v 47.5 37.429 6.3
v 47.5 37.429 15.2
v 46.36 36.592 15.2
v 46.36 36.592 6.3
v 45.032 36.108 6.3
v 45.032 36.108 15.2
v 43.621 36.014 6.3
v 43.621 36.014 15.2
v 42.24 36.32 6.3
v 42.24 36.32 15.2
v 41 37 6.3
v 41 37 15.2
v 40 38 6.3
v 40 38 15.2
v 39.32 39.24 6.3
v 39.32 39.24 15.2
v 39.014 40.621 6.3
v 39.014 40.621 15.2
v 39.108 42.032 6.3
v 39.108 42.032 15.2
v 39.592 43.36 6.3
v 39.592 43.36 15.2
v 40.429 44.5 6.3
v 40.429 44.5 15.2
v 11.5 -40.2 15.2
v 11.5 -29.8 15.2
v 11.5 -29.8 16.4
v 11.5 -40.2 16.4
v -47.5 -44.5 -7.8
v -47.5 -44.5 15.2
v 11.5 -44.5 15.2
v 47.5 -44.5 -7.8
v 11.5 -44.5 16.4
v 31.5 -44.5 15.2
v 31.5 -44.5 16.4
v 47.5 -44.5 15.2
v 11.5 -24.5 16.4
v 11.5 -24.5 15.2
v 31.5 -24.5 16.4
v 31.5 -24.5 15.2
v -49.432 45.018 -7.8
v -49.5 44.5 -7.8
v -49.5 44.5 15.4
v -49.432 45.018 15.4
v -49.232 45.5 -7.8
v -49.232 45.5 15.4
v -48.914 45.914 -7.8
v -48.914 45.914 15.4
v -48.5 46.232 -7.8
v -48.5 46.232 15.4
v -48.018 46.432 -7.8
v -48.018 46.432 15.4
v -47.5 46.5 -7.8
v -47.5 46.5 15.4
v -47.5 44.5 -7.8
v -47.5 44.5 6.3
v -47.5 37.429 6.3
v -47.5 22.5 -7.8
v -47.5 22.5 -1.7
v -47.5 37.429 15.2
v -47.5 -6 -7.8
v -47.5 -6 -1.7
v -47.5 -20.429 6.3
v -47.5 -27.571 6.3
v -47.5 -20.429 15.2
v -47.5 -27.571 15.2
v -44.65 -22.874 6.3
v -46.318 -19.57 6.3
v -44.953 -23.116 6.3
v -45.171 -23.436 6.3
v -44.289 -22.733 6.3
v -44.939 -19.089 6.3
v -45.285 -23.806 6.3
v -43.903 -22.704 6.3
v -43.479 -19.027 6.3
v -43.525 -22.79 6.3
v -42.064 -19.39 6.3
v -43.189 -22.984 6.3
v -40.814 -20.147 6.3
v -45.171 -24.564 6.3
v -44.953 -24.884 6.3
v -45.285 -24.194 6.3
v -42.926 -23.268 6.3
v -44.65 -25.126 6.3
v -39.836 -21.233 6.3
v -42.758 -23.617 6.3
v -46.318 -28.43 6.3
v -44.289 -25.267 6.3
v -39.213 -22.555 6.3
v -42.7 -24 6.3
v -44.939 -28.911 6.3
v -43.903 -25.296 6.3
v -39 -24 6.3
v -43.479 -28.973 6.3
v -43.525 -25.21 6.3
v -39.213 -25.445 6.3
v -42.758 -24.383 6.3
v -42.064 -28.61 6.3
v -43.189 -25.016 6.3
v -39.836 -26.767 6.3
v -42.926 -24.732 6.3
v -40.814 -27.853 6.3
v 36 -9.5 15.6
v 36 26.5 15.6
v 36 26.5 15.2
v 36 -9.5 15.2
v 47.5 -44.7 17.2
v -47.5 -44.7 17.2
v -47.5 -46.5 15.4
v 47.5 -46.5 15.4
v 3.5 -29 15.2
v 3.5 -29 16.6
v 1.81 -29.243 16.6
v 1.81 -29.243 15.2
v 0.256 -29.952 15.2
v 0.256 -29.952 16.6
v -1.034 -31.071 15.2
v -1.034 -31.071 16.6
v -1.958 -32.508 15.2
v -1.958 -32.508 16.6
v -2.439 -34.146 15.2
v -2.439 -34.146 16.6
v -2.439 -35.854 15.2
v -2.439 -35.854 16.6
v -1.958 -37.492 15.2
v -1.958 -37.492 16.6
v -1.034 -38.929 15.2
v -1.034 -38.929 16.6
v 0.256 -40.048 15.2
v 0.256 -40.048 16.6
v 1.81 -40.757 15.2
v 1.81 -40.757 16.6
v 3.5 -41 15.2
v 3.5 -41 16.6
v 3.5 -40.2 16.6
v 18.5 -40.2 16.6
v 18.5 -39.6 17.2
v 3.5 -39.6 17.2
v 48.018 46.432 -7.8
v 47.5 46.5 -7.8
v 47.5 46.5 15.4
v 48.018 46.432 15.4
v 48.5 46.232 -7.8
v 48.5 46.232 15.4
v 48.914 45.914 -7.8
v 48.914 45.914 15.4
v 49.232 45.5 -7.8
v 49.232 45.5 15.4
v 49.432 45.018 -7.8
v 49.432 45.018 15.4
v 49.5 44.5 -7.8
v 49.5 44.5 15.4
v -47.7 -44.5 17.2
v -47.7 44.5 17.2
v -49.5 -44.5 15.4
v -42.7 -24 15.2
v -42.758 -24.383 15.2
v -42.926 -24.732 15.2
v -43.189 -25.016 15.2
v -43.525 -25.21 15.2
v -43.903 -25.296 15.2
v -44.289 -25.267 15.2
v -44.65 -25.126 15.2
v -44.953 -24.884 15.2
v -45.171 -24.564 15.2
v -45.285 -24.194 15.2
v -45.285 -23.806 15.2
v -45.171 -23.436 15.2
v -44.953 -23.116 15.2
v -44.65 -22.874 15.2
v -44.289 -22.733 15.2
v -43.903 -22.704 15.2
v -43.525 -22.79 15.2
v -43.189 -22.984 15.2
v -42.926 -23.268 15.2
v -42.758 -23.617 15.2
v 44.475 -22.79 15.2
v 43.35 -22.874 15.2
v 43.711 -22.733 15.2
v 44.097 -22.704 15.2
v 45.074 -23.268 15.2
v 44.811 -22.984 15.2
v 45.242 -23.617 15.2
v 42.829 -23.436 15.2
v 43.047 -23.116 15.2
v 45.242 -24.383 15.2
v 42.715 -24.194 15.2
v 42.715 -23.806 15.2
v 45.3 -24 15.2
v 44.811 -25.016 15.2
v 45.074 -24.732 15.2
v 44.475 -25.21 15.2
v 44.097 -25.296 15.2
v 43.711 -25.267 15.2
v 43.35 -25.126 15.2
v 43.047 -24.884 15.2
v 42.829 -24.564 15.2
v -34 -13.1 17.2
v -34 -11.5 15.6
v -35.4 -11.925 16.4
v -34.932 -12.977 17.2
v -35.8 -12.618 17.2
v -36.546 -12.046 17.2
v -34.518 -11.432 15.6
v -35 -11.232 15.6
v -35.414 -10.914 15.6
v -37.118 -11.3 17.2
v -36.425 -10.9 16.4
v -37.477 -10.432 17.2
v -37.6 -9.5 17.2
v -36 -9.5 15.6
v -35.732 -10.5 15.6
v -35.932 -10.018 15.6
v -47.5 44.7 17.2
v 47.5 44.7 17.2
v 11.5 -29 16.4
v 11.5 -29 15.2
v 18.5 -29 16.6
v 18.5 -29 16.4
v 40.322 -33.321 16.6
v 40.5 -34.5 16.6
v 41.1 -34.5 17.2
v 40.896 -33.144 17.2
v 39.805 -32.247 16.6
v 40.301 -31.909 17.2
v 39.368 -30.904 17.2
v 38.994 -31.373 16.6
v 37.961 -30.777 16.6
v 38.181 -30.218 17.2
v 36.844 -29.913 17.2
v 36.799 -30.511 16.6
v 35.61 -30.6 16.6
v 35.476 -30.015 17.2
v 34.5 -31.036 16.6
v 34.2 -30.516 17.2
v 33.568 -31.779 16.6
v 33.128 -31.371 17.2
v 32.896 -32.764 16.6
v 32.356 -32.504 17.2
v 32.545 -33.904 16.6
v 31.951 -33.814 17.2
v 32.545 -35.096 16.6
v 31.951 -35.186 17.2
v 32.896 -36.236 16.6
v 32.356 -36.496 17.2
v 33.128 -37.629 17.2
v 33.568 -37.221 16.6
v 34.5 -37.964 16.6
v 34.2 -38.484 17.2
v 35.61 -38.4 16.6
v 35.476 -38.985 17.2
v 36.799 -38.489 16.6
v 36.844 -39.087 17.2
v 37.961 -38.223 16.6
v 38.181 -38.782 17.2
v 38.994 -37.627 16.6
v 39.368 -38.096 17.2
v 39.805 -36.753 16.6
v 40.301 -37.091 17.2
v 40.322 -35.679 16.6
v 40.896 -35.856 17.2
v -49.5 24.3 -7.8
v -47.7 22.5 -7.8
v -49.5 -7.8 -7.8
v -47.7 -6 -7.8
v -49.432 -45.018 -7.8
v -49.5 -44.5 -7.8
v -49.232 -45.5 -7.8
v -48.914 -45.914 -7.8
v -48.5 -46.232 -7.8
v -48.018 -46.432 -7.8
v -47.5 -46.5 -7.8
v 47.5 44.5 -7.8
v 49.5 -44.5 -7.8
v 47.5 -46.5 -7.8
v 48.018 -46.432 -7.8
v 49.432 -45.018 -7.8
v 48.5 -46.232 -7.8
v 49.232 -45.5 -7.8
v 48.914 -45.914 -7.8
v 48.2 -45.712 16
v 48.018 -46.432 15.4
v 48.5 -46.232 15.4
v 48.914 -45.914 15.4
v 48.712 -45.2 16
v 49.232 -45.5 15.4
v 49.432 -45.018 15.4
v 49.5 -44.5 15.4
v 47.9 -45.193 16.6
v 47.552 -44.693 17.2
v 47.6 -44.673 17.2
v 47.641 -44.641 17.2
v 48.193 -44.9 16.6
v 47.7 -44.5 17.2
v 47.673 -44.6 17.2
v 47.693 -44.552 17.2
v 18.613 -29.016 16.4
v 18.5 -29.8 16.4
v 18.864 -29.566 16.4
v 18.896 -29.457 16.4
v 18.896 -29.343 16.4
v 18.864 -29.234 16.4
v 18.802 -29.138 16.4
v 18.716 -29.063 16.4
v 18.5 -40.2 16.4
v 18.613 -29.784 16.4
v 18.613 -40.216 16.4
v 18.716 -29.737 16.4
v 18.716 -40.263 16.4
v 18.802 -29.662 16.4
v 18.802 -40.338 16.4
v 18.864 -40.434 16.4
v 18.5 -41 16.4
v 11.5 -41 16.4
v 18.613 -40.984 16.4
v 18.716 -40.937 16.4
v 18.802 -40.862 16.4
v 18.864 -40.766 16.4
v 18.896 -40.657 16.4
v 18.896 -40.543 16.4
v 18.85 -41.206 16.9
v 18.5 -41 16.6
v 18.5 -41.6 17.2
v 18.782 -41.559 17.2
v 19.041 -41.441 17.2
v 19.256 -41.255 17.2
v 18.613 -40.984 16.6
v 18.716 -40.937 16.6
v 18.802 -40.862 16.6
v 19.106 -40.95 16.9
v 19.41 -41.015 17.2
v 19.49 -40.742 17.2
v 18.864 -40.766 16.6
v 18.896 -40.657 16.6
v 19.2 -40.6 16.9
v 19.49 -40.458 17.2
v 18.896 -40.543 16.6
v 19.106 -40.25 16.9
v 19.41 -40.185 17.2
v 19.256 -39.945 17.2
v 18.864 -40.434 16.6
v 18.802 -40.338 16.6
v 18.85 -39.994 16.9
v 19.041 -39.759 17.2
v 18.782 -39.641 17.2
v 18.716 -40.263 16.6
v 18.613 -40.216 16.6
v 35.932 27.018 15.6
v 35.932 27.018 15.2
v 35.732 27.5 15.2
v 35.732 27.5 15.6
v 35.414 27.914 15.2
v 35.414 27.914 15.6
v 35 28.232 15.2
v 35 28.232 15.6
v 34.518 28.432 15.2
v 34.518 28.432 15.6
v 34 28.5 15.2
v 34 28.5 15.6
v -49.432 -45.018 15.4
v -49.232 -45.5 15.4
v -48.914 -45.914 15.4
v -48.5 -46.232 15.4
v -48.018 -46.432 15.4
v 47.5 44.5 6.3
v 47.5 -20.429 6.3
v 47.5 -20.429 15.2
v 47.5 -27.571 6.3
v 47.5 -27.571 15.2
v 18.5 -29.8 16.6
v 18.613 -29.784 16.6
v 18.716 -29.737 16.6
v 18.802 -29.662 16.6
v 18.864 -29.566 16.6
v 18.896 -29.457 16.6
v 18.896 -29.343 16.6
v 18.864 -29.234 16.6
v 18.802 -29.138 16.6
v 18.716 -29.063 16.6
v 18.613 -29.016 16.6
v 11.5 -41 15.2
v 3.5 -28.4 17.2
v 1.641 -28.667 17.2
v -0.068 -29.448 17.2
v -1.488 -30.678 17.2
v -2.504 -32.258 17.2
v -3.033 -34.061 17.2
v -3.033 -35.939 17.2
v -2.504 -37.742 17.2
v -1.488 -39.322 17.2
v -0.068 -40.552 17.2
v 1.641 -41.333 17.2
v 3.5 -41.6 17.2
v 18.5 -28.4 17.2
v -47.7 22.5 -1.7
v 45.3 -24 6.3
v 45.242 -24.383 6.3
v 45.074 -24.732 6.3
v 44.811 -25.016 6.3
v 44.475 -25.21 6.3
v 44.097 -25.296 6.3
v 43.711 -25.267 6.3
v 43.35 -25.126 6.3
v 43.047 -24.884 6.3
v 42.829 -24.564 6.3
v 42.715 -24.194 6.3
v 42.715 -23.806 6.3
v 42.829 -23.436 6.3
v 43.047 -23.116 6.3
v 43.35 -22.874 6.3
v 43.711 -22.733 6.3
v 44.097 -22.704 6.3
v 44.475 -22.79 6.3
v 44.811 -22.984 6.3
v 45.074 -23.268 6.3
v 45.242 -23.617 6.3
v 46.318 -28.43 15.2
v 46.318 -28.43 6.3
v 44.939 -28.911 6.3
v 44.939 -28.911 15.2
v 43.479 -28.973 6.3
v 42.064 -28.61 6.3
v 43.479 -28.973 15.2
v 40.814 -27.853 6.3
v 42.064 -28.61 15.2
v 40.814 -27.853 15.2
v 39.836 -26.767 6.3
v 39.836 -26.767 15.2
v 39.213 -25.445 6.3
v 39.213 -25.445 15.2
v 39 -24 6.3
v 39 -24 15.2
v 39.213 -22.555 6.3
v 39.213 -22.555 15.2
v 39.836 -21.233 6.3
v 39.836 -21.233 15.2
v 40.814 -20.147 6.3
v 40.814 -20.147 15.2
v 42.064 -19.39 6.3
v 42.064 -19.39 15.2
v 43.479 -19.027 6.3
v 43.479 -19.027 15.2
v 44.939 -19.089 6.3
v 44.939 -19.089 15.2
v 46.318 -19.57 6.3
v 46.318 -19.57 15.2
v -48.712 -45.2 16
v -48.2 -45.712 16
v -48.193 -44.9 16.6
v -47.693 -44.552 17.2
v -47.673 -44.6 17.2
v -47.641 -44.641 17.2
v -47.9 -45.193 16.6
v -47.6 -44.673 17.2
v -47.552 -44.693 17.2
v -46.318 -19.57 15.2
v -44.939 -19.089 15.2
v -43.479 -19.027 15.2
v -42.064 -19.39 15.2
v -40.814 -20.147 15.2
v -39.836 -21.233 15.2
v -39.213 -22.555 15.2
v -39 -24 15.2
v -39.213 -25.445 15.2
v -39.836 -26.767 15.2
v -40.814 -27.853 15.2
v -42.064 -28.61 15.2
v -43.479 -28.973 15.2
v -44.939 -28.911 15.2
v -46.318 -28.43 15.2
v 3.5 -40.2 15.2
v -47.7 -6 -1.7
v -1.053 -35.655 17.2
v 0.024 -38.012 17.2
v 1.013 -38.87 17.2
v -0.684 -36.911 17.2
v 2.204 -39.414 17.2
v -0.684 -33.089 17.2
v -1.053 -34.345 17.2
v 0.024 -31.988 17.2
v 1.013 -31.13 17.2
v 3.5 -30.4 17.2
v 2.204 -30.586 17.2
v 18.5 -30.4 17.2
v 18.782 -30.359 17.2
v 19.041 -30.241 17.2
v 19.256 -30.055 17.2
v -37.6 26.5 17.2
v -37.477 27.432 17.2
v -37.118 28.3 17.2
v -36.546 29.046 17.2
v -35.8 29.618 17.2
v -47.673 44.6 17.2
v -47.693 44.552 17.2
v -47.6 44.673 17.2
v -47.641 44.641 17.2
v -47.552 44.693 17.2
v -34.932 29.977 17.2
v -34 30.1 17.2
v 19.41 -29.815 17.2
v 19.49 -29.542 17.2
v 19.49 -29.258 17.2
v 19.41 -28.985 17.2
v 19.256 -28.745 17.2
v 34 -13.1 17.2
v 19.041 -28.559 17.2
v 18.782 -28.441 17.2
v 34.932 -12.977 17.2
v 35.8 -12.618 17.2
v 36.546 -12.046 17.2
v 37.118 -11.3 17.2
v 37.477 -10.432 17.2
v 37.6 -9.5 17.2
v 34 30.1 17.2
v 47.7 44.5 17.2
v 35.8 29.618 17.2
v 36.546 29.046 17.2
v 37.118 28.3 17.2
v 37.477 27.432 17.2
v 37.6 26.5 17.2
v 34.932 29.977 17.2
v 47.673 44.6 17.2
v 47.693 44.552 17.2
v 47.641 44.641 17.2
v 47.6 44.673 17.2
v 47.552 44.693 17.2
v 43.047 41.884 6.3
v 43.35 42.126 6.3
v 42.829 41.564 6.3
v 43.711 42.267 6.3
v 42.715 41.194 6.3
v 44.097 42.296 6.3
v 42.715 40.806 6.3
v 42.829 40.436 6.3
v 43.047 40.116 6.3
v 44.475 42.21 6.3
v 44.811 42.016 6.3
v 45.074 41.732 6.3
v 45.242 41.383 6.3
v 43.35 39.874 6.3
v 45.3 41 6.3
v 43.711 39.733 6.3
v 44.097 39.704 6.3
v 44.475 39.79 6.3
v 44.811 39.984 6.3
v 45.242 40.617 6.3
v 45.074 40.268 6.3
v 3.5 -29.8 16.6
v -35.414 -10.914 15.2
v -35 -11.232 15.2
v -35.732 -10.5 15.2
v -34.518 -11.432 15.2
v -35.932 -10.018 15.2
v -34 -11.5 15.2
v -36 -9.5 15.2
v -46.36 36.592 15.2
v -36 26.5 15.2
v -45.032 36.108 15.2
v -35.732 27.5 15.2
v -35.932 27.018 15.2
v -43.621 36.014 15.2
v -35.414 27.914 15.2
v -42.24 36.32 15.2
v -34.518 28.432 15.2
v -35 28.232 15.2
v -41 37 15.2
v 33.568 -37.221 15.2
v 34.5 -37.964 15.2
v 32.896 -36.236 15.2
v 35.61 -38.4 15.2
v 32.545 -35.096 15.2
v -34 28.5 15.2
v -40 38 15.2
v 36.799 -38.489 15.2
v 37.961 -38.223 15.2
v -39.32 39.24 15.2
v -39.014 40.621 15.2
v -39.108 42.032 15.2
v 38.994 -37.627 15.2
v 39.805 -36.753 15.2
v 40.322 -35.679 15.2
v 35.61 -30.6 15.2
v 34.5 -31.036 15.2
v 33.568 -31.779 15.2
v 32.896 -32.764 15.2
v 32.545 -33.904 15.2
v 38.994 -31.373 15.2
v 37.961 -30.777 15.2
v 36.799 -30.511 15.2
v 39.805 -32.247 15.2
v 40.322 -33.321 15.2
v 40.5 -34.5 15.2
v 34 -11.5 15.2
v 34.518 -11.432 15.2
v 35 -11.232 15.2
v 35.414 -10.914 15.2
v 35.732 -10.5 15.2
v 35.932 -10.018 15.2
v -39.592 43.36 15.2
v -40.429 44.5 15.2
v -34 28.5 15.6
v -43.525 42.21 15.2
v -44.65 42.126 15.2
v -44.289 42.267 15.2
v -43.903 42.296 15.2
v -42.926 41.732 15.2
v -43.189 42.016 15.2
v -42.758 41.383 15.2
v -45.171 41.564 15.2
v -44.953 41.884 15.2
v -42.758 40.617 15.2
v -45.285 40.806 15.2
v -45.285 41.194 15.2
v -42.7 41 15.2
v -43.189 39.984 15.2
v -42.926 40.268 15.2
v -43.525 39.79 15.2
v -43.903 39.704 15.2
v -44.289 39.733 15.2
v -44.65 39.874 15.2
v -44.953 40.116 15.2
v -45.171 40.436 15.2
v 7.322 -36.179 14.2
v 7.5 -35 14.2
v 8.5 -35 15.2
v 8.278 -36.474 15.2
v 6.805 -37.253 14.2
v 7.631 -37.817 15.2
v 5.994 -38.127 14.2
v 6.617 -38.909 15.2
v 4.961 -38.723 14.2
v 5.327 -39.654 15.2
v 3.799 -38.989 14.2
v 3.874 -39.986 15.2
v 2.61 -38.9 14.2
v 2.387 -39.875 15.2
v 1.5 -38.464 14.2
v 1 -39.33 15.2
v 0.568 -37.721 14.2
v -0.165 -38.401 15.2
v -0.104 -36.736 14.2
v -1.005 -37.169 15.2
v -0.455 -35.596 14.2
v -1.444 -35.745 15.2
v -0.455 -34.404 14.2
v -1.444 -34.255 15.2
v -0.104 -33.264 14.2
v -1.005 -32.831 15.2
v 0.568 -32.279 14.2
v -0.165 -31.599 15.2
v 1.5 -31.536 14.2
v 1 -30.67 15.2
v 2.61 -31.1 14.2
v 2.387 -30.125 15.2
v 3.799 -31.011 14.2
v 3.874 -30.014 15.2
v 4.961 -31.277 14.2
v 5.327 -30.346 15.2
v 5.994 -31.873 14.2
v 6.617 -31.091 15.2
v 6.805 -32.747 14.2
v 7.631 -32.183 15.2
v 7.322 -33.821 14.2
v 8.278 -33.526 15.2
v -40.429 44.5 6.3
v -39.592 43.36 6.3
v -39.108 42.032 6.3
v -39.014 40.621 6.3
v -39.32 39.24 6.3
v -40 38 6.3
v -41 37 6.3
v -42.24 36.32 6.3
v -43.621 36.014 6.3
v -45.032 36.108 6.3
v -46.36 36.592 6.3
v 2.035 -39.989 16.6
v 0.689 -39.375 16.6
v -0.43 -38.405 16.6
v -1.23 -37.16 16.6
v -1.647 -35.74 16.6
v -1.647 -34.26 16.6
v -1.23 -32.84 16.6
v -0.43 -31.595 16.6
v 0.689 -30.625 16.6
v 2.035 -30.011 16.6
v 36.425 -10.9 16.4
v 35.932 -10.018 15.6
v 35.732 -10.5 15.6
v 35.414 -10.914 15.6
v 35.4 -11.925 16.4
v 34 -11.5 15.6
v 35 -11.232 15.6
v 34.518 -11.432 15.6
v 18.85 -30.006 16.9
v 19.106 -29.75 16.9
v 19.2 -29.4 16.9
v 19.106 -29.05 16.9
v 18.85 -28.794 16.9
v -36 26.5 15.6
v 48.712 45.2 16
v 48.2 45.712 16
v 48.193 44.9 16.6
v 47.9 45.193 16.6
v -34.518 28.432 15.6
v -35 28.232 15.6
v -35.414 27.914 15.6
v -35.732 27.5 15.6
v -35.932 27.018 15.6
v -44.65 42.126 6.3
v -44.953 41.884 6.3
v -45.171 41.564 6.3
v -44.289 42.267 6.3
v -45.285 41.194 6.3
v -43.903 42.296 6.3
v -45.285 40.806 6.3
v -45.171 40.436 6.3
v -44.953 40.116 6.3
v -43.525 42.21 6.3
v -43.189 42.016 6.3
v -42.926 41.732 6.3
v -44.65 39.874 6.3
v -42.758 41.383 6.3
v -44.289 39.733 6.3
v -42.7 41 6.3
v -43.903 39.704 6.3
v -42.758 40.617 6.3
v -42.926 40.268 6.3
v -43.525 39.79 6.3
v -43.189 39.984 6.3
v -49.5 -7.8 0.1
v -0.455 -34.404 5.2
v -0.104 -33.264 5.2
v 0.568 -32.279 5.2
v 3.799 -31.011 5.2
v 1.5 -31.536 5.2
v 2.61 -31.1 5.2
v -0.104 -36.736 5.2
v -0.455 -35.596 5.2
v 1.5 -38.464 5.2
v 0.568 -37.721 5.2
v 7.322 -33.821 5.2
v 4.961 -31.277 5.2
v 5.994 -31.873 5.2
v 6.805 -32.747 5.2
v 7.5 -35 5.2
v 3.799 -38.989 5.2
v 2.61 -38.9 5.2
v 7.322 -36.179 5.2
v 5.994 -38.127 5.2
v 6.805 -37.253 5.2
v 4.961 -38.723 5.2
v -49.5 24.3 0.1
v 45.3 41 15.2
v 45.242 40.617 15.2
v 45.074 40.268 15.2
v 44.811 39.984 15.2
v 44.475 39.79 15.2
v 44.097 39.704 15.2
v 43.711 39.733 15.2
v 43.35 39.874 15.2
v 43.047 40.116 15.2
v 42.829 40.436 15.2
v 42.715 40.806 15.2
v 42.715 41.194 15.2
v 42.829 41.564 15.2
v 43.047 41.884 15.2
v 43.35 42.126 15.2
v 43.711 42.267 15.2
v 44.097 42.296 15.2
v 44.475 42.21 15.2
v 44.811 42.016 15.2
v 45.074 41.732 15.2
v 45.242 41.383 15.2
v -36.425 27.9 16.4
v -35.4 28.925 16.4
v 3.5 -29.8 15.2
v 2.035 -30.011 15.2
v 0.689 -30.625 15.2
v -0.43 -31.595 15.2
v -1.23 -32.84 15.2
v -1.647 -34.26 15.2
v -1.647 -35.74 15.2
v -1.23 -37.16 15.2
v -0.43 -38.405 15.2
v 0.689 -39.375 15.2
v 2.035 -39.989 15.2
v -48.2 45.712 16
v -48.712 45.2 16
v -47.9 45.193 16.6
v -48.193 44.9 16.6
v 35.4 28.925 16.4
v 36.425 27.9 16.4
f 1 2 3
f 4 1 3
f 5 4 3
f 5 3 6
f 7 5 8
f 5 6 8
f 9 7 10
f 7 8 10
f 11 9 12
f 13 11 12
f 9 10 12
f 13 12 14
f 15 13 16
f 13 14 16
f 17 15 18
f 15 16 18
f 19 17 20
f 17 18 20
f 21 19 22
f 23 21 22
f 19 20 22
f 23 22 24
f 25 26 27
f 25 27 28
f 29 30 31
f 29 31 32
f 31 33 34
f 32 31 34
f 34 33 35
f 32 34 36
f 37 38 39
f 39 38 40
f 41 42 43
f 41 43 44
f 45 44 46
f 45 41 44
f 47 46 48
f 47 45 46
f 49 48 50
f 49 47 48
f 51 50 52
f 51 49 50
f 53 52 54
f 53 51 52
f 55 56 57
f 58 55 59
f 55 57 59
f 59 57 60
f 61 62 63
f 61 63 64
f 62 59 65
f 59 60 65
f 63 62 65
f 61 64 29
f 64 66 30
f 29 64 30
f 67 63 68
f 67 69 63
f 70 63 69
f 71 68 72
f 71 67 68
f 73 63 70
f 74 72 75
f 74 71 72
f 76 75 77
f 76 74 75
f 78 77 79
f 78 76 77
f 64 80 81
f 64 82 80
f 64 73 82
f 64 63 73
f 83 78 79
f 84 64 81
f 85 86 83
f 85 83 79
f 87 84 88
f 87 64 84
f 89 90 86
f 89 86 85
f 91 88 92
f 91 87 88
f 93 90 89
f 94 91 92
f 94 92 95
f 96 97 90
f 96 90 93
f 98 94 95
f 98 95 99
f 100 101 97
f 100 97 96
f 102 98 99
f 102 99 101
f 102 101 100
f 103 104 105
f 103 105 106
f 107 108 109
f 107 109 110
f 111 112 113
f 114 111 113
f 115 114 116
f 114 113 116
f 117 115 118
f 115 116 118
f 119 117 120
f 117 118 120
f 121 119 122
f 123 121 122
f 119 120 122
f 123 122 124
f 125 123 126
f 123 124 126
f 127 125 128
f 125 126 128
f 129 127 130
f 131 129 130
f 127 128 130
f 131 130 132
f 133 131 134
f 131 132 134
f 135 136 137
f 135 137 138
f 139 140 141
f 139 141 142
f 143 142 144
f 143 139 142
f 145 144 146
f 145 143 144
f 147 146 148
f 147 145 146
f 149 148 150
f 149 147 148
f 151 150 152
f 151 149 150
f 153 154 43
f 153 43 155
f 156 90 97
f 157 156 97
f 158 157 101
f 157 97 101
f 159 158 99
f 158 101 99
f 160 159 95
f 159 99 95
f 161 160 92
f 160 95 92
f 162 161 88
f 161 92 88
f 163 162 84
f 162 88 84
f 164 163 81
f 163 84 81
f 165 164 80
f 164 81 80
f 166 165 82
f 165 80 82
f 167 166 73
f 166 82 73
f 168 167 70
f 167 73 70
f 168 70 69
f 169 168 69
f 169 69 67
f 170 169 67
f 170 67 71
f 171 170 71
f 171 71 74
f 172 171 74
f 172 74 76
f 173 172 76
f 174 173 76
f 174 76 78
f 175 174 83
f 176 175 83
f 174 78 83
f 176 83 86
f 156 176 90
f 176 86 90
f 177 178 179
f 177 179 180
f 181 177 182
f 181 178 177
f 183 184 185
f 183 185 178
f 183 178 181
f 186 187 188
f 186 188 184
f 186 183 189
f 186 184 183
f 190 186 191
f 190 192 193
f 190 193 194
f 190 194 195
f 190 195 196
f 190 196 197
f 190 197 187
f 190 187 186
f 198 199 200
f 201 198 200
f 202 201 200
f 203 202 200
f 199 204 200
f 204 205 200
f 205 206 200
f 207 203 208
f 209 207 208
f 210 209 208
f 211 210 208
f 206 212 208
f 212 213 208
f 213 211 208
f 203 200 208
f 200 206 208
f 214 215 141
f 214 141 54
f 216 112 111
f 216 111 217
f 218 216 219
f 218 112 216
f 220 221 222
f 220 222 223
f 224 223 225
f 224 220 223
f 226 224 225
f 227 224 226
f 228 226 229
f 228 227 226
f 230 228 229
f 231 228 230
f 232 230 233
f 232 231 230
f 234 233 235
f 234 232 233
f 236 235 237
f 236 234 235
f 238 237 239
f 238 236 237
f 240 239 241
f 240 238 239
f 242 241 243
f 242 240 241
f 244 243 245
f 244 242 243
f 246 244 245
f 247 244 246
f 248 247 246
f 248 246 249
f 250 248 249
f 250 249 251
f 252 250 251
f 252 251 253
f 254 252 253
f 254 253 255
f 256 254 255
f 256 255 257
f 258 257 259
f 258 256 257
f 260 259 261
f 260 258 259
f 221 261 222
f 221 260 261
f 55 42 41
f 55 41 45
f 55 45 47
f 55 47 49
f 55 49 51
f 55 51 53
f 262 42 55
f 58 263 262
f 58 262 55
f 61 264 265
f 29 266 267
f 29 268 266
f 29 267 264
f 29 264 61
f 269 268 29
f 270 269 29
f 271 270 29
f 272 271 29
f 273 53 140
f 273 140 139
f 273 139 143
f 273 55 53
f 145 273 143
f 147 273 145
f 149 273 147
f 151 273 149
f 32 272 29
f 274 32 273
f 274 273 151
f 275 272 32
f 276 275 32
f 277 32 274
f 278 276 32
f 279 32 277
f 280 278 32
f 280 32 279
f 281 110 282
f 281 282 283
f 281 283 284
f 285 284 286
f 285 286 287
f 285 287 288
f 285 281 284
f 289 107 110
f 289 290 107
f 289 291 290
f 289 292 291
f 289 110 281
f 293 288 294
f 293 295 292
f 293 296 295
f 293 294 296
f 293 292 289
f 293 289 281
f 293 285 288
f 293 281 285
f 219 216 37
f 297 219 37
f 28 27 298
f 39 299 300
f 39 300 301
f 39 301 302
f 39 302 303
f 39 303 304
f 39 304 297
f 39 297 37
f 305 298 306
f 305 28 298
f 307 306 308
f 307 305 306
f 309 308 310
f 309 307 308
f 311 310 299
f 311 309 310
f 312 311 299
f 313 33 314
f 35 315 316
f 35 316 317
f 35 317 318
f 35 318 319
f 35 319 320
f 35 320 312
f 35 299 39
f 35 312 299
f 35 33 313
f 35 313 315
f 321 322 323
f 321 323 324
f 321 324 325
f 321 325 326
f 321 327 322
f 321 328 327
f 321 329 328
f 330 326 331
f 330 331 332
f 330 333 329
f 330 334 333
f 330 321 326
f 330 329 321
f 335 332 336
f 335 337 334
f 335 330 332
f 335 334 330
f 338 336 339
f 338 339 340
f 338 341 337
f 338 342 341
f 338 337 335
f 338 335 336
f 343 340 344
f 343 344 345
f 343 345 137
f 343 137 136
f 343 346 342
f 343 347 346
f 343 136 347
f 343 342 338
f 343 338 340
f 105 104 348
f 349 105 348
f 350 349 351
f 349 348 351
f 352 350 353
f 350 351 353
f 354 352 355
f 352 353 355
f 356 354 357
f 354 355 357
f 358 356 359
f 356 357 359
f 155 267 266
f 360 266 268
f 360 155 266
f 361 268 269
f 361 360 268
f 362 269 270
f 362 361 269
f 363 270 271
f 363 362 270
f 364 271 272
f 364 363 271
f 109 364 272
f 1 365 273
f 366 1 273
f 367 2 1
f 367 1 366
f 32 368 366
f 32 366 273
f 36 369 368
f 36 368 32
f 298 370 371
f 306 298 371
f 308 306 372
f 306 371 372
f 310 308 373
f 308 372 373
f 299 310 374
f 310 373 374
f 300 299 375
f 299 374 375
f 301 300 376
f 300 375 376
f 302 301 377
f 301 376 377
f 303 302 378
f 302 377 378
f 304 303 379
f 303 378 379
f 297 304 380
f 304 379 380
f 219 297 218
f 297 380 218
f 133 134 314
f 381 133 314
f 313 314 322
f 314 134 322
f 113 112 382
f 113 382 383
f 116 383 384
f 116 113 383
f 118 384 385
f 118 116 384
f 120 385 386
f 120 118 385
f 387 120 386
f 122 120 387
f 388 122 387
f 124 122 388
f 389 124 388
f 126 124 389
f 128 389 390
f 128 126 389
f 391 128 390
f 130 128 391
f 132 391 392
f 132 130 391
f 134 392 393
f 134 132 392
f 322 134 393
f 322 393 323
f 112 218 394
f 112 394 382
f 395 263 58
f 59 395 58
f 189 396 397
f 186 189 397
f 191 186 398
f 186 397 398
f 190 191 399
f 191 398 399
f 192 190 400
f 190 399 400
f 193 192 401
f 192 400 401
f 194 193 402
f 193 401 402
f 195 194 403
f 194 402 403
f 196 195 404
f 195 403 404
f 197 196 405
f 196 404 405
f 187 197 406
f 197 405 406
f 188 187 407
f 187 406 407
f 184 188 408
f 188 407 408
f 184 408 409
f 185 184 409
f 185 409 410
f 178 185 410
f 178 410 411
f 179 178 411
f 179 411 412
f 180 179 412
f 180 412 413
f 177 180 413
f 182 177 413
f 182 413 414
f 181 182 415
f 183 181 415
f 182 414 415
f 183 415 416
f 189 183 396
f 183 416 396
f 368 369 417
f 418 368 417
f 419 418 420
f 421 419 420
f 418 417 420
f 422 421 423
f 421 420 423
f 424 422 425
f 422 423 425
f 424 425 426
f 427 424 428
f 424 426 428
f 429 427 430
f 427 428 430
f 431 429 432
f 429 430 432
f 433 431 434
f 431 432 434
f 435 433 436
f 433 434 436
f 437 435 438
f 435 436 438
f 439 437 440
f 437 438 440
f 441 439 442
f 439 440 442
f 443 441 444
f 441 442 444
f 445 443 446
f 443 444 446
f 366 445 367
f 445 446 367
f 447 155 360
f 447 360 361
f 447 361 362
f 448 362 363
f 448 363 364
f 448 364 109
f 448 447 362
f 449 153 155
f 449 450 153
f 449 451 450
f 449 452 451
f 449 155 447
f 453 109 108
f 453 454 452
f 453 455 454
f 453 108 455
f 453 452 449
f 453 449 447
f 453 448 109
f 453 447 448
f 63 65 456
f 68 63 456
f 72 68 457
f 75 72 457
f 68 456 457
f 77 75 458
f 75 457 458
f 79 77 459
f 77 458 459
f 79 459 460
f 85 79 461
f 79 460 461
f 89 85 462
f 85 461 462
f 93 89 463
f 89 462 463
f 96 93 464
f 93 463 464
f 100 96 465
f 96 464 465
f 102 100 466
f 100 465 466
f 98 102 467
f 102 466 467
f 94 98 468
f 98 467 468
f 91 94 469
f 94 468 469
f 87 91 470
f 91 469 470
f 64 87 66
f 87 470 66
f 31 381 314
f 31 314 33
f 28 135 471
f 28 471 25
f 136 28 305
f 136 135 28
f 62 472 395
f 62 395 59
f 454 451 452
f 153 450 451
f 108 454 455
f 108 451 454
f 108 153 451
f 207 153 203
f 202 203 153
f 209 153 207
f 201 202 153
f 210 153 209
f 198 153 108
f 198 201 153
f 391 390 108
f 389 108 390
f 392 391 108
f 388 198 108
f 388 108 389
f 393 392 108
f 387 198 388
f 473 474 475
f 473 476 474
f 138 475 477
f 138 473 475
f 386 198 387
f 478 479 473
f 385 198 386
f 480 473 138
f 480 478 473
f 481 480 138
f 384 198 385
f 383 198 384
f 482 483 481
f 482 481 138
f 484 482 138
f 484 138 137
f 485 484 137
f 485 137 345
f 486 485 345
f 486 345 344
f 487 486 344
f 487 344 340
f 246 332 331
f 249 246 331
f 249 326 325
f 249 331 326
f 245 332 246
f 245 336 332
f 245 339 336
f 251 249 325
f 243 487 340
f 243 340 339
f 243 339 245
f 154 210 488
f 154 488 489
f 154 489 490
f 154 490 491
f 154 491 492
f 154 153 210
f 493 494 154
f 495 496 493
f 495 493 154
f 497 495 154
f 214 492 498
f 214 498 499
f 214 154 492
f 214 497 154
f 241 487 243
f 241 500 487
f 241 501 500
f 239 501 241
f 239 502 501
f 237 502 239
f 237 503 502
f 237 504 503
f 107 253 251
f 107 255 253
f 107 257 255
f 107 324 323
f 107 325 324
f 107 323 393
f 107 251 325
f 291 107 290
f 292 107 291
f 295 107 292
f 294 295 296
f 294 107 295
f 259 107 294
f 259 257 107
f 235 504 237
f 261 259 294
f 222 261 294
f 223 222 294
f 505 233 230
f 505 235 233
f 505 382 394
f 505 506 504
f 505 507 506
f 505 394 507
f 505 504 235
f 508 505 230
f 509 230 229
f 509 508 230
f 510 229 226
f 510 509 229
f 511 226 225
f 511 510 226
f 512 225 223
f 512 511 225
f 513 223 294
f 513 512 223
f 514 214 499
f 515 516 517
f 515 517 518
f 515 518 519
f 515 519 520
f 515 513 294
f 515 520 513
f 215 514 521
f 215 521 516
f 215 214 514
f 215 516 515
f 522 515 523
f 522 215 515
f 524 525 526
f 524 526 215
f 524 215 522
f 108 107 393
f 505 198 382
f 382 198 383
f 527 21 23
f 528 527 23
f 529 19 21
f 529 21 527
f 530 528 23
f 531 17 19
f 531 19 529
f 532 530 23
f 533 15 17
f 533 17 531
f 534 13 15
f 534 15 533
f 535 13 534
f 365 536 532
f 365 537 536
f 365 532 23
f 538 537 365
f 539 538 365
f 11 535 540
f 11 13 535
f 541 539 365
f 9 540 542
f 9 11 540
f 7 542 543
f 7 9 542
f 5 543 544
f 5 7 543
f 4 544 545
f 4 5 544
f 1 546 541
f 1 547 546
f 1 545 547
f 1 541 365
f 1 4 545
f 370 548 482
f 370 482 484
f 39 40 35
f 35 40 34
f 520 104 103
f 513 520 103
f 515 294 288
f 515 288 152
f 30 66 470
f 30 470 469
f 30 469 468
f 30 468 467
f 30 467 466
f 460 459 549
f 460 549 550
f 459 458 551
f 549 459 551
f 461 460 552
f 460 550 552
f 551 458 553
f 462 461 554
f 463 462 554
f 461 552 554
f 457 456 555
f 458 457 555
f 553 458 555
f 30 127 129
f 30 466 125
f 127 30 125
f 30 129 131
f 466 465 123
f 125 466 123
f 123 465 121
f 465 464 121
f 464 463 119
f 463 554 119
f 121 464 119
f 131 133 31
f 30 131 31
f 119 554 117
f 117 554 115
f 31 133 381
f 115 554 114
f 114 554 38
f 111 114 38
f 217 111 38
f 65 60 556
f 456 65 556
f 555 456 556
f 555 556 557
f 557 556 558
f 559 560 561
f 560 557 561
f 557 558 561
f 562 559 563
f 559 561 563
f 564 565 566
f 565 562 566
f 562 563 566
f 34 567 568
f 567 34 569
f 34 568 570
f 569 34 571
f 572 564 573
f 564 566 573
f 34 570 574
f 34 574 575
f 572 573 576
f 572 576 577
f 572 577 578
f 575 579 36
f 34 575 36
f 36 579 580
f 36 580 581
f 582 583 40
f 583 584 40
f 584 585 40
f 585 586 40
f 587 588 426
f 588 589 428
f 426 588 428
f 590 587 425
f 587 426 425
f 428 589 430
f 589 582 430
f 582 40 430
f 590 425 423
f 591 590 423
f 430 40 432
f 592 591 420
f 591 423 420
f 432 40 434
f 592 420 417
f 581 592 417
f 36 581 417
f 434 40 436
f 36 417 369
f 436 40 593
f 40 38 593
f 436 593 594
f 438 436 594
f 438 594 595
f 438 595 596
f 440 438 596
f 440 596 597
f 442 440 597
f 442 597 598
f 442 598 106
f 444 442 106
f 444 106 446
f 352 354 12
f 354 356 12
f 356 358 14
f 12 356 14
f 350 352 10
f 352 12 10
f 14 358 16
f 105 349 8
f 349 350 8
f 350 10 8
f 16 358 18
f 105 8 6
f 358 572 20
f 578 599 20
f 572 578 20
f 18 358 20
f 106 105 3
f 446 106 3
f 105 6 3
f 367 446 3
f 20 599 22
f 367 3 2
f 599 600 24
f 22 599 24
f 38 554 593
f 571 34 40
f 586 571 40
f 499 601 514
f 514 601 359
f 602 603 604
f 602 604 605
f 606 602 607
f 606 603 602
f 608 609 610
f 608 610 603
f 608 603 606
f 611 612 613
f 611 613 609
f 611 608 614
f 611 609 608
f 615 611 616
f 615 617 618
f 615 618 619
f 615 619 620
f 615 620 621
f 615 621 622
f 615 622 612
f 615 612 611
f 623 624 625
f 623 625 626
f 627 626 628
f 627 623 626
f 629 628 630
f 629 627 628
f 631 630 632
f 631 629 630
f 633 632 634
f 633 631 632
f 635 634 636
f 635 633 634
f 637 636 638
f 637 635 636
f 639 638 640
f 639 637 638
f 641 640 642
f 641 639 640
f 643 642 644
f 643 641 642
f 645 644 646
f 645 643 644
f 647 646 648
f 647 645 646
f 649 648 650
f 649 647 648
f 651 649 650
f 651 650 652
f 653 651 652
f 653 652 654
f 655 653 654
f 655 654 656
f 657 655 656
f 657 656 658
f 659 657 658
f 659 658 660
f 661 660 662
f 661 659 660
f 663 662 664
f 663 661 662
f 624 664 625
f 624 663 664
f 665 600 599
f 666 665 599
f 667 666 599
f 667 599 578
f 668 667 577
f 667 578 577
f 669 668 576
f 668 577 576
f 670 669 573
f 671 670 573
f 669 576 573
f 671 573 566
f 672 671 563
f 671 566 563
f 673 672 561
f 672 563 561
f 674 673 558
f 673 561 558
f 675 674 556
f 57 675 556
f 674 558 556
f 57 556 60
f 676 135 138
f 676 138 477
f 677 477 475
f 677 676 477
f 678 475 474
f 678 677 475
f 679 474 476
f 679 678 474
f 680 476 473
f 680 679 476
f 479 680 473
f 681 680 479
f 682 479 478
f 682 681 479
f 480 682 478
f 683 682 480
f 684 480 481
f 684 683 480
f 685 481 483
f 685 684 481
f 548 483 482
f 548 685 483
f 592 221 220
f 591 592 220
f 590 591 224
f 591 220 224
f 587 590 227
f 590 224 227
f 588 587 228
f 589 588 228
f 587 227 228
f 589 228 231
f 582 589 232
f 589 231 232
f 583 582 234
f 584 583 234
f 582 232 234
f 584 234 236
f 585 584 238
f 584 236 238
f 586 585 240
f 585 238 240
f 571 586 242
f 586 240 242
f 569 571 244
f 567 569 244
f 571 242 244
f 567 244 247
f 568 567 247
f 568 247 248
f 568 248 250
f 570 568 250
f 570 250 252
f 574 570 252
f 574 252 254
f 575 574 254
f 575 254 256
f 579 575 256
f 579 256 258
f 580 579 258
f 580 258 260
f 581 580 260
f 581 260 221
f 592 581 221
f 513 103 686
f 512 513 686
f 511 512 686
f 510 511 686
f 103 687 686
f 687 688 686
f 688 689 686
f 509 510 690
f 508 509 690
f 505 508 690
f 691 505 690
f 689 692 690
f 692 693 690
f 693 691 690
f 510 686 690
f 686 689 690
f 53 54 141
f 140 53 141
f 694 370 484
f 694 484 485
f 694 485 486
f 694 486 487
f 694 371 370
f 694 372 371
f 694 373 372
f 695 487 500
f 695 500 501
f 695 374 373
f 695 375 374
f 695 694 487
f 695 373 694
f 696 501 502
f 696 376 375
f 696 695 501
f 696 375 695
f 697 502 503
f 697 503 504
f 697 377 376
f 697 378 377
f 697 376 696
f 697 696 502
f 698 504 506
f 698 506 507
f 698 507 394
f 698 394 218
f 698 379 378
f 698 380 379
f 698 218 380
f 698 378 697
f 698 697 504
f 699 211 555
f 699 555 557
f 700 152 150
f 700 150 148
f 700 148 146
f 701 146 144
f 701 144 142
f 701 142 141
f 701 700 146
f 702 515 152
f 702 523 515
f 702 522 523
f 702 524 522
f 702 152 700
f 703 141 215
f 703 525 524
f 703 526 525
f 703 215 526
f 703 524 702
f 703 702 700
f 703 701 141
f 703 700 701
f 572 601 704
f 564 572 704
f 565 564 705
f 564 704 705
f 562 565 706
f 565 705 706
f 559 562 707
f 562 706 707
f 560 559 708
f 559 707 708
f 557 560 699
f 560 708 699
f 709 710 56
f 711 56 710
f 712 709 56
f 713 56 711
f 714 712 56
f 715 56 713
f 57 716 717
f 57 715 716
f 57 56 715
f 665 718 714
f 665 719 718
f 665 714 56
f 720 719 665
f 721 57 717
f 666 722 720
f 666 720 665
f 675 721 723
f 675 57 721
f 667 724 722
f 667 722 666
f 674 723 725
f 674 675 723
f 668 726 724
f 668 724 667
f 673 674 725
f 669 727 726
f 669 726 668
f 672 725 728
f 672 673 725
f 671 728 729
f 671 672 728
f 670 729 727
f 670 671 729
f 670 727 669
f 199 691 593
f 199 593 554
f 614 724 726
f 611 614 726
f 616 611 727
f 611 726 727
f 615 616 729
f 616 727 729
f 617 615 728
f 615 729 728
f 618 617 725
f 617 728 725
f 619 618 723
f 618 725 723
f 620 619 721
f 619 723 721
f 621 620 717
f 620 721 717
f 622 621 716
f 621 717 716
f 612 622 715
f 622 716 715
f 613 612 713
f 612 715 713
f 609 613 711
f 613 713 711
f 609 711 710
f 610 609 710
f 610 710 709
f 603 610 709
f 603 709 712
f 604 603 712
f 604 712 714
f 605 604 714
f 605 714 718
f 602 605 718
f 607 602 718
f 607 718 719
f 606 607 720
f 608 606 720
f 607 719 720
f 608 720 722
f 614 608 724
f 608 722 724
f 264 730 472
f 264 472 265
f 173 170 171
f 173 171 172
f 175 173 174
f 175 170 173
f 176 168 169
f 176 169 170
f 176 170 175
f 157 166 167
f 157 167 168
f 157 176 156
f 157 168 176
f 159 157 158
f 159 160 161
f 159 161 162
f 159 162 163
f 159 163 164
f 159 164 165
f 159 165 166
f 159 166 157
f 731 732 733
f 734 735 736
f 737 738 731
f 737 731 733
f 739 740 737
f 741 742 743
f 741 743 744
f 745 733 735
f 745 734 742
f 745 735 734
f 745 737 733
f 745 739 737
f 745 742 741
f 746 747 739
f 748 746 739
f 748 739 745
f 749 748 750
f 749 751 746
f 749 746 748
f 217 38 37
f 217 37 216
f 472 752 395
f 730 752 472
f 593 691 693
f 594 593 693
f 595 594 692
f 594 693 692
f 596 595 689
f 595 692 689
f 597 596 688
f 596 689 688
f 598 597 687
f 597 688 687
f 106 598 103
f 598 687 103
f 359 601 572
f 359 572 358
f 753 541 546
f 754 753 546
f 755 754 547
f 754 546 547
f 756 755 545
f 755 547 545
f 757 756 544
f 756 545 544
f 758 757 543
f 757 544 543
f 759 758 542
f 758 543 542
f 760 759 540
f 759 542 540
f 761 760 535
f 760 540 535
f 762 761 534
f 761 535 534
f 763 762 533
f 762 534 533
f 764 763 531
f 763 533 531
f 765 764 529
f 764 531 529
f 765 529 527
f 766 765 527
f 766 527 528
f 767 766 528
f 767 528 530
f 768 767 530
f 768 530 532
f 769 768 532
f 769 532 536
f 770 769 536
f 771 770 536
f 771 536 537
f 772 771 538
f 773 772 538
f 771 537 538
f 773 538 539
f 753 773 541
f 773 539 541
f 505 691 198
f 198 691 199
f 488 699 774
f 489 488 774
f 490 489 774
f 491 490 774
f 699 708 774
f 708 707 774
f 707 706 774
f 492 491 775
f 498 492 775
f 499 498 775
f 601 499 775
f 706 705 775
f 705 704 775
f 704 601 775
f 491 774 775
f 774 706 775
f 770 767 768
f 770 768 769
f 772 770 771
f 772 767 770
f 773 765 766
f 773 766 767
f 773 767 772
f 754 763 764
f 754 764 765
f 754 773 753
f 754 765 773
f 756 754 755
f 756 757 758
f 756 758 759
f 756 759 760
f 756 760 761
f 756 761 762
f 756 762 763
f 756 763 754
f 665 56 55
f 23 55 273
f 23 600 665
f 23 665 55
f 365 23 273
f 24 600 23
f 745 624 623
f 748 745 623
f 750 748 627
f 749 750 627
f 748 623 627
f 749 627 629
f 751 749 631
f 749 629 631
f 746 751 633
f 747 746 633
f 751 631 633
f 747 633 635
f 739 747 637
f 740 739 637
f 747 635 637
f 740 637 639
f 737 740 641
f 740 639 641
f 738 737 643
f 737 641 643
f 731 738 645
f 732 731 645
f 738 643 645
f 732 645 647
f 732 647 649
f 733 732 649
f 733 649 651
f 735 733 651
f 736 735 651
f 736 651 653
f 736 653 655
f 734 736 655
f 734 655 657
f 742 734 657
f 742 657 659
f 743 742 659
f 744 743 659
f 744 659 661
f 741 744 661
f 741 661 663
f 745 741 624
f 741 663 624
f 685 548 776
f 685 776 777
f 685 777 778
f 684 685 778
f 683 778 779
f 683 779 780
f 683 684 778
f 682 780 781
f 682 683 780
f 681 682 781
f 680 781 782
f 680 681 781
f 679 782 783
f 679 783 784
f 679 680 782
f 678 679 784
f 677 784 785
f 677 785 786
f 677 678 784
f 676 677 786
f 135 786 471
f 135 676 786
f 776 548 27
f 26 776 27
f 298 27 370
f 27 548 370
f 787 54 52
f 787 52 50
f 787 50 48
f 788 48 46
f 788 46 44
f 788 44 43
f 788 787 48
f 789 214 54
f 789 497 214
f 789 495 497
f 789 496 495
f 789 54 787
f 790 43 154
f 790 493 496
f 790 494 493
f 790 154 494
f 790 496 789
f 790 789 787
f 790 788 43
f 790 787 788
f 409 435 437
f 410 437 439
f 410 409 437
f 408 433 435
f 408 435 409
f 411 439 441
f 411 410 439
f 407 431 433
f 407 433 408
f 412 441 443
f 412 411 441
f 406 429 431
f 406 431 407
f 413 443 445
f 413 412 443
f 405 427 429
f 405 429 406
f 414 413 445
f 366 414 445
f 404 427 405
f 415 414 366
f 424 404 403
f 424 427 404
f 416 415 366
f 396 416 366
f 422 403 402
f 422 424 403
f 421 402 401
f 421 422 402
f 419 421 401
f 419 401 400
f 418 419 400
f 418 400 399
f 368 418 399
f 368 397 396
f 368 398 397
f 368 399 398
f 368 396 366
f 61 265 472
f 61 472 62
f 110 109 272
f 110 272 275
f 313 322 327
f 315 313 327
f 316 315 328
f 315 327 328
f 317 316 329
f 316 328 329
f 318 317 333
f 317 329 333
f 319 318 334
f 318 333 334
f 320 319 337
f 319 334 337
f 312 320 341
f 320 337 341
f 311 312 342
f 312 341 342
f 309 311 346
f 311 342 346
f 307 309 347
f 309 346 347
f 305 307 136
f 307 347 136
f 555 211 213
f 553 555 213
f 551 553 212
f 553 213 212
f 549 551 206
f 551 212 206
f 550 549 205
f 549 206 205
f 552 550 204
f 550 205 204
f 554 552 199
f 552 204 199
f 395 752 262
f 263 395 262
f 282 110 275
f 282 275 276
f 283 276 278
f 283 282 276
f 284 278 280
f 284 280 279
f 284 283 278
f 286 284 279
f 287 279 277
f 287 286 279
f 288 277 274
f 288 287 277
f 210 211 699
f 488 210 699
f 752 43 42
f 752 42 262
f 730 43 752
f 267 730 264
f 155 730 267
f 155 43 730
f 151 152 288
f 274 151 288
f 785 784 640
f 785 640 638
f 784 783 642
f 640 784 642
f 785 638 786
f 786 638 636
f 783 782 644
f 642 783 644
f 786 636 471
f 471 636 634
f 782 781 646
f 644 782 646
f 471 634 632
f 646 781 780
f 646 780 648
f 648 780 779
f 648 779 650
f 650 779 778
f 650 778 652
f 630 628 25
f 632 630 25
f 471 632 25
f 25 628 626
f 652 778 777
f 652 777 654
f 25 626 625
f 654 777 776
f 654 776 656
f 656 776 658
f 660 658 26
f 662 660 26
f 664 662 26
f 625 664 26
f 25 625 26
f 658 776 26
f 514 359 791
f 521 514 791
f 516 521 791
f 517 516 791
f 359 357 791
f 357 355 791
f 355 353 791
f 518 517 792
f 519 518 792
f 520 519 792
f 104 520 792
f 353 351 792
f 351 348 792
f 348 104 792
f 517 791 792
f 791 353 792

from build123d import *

# Parameters (mm, degrees)
SKETCH001018_W   = 99
SKETCH001018_H   = 93
PAD013_DEPTH     = 2
SKETCH001019_R   = 4
POCKET004_DEPTH  = 2.001
SKETCH001020_W   = 99
SKETCH001020_H   = 93
SKETCH001020_W_2 = 95
SKETCH001020_H_2 = 89
PAD014_DEPTH     = 23
PAD015_DEPTH     = 8.9
SKETCH001022_R   = 1.3
POCKET005_DEPTH  = 8.9
FILLET004_R      = 2
CHAMFER001_SIZE  = 1.8
CHAMFER002_SIZE  = 1.6
SKETCH001023_R   = 4
PAD016_DEPTH     = 10
CHAMFER003_SIZE  = 1
SKETCH001024_W   = 20
SKETCH001024_H   = 20
POCKET006_DEPTH  = 1.2
SKETCH001025_W   = 4
SKETCH001025_H   = 28.5
POCKET007_DEPTH  = 6.1
CHAMFER004_SIZE  = 1.8
CHAMFER005_SIZE  = 0.6
CHAMFER006_SIZE  = 0.6


with BuildPart() as part:
    # Sketch001018 → Pad013 (new body)
    with BuildSketch(Plane.XY.offset(15.2)):
        Rectangle(SKETCH001018_W, SKETCH001018_H)
    extrude(amount=PAD013_DEPTH)

    # Sketch001019 → Pocket004 (cut, through all)
    with BuildSketch(Plane.XY.offset(17.2)):
        with Locations((36.5, -34.5)):
            Circle(SKETCH001019_R)
        with BuildLine():
            Line((-34, 28.5), (34, 28.5))
            ThreePointArc((36, 26.5), (35.414214, 27.914214), (34, 28.5))
            Line((36, 26.5), (36, -9.5))
            ThreePointArc((34, -11.5), (35.414214, -10.914214), (36, -9.5))
            Line((34, -11.5), (-34, -11.5))
            ThreePointArc((-36, -9.5), (-35.414214, -10.914214), (-34, -11.5))
            Line((-36, -9.5), (-36, 26.5))
            ThreePointArc((-34, 28.5), (-35.414214, 27.914214), (-36, 26.5))
        make_face()
        with BuildLine():
            ThreePointArc((3.5, -29.8), (-1.7, -35), (3.5, -40.2))
            Line((3.5, -40.2), (18.5, -40.2))
            ThreePointArc((18.5, -41), (18.9, -40.6), (18.5, -40.2))
            Line((3.500001, -41), (18.5, -41))
            ThreePointArc((3.5, -29), (-2.5, -35), (3.500001, -41))
            Line((3.5, -29), (18.5, -29))
            ThreePointArc((18.499999, -29.8), (18.9, -29.4), (18.5, -29))
            Line((3.5, -29.8), (18.499999, -29.8))
        make_face()
    extrude(amount=-POCKET004_DEPTH, mode=Mode.SUBTRACT)

    # Sketch001020 → Pad014 (new body)
    with BuildSketch(Plane(origin=(0, 0, 15.2), x_dir=(1, 0, 0), z_dir=(0, 0, -1))):
        Rectangle(SKETCH001020_W, SKETCH001020_H)
        Rectangle(SKETCH001020_W_2, SKETCH001020_H_2, mode=Mode.SUBTRACT)
    extrude(amount=PAD014_DEPTH)

    # Sketch001021 → Pad015 (new body)
    with BuildSketch(Plane(origin=(0, 0, 15.2), x_dir=(1, 0, 0), z_dir=(0, 0, -1))):
        with BuildLine():
            ThreePointArc((-40.429286, -44.5), (-40.464466, -37.464466), (-47.5, -37.429286))
            Line((-47.5, -37.429286), (-47.5, -44.5))
            Line((-47.5, -44.5), (-40.429286, -44.5))
        make_face()
        with BuildLine():
            ThreePointArc((-47.5, 20.429286), (-39, 24), (-47.5, 27.570714))
            Line((-47.5, 27.570714), (-47.5, 20.429286))
        make_face()
        with BuildLine():
            ThreePointArc((47.5, 27.570714), (39, 24), (47.5, 20.429286))
            Line((47.5, 27.570714), (47.5, 20.429286))
        make_face()
        with BuildLine():
            ThreePointArc((47.5, -37.429286), (40.464466, -37.464466), (40.429286, -44.5))
            Line((47.5, -44.5), (40.429286, -44.5))
            Line((47.5, -37.429286), (47.5, -44.5))
        make_face()
    extrude(amount=PAD015_DEPTH)

    # Sketch001022 → Pocket005 (cut)
    with BuildSketch(Plane(origin=(0, 0, 6.3), x_dir=(1, 0, 0), z_dir=(0, 0, -1))):
        with Locations((-44, 24)):
            Circle(SKETCH001022_R)
        with Locations((44, 24)):
            Circle(SKETCH001022_R)
        with Locations((-44, -41)):
            Circle(SKETCH001022_R)
        with Locations((44, -41)):
            Circle(SKETCH001022_R)
    extrude(amount=-POCKET005_DEPTH, mode=Mode.SUBTRACT)

    # Fillet004
    fillet004_edges = [part.edges().sort_by_distance(p)[0] for p in [
        (-49.5, -46.5, 3.7),
        (-49.5, -46.5, 16.2),
        (-49.5, 46.5, 16.2),
        (-49.5, 46.5, 3.7),
        (49.5, 46.5, 16.2),
        (49.5, 46.5, 3.7),
        (49.5, -46.5, 16.2),
        (49.5, -46.5, 3.7),
    ]]
    fillet(fillet004_edges, radius=FILLET004_R)

    # Chamfer001
    chamfer001_edges = [part.edges().sort_by_distance(p)[0] for p in [
        (0, -46.5, 17.2),
        (-48.914214, -45.914214, 17.2),
        (-49.5, 0, 17.2),
        (48.914214, -45.914214, 17.2),
        (49.5, 0, 17.2),
        (48.914214, 45.914214, 17.2),
        (0, 46.5, 17.2),
        (-48.914214, 45.914214, 17.2),
    ]]
    chamfer(chamfer001_edges, length=CHAMFER001_SIZE)

    # Chamfer002
    chamfer002_edges = [part.edges().sort_by_distance(p)[0] for p in [
        (0, 28.5, 17.2),
        (35.414214, 27.914214, 17.2),
        (36, 8.5, 17.2),
        (35.414214, -10.914214, 17.2),
        (-35.414214, 27.914214, 17.2),
        (-36, 8.5, 17.2),
        (-35.414214, -10.914214, 17.2),
        (0, -11.5, 17.2),
    ]]
    chamfer(chamfer002_edges, length=CHAMFER002_SIZE)

    # Sketch001023 → Pad016 (new body)
    with BuildSketch(Plane(origin=(0, 0, 15.2), x_dir=(1, 0, 0), z_dir=(0, 0, -1))):
        with Locations((3.5, 35)):
            Circle(SKETCH001023_R)
    extrude(amount=PAD016_DEPTH)

    # Chamfer003
    chamfer003_edges = [part.edges().sort_by_distance(p)[0] for p in [
        (-0.5, -35, 15.2),
    ]]
    chamfer(chamfer003_edges, length=CHAMFER003_SIZE)

    # Sketch001024 → Pocket006 (cut)
    with BuildSketch(Plane(origin=(0, 0, 15.2), x_dir=(1, 0, 0), z_dir=(0, 0, -1))):
        with Locations((21.5, 34.5)):
            Rectangle(SKETCH001024_W, SKETCH001024_H)
    extrude(amount=-POCKET006_DEPTH, mode=Mode.SUBTRACT)

    # Sketch001025 → Pocket007 (cut)
    with BuildSketch(Plane(origin=(0, 0, -7.8), x_dir=(1, 0, 0), z_dir=(0, 0, -1))):
        with Locations((-48.5, -8.25)):
            Rectangle(SKETCH001025_W, SKETCH001025_H)
    extrude(amount=-POCKET007_DEPTH, mode=Mode.SUBTRACT)

    # Chamfer004
    chamfer004_edges = [part.edges().sort_by_distance(p)[0] for p in [
        (-49.5, -6, -4.75),
        (-49.5, 8.25, -1.7),
        (-49.5, 22.5, -4.75),
    ]]
    chamfer(chamfer004_edges, length=CHAMFER004_SIZE)

    # Chamfer005
    chamfer005_edges = [part.edges().sort_by_distance(p)[0] for p in [
        (11, -29.8, 17.2),
        (18.9, -29.4, 17.2),
        (11, -29, 17.2),
        (-2.5, -35, 17.2),
        (-1.7, -35, 17.2),
        (11, -40.2, 17.2),
        (11, -41, 17.2),
        (18.9, -40.6, 17.2),
    ]]
    chamfer(chamfer005_edges, length=CHAMFER005_SIZE)

    # Chamfer006
    chamfer006_edges = [part.edges().sort_by_distance(p)[0] for p in [
        (32.5, -34.5, 17.2),
    ]]
    chamfer(chamfer006_edges, length=CHAMFER006_SIZE)


solid = part.part
